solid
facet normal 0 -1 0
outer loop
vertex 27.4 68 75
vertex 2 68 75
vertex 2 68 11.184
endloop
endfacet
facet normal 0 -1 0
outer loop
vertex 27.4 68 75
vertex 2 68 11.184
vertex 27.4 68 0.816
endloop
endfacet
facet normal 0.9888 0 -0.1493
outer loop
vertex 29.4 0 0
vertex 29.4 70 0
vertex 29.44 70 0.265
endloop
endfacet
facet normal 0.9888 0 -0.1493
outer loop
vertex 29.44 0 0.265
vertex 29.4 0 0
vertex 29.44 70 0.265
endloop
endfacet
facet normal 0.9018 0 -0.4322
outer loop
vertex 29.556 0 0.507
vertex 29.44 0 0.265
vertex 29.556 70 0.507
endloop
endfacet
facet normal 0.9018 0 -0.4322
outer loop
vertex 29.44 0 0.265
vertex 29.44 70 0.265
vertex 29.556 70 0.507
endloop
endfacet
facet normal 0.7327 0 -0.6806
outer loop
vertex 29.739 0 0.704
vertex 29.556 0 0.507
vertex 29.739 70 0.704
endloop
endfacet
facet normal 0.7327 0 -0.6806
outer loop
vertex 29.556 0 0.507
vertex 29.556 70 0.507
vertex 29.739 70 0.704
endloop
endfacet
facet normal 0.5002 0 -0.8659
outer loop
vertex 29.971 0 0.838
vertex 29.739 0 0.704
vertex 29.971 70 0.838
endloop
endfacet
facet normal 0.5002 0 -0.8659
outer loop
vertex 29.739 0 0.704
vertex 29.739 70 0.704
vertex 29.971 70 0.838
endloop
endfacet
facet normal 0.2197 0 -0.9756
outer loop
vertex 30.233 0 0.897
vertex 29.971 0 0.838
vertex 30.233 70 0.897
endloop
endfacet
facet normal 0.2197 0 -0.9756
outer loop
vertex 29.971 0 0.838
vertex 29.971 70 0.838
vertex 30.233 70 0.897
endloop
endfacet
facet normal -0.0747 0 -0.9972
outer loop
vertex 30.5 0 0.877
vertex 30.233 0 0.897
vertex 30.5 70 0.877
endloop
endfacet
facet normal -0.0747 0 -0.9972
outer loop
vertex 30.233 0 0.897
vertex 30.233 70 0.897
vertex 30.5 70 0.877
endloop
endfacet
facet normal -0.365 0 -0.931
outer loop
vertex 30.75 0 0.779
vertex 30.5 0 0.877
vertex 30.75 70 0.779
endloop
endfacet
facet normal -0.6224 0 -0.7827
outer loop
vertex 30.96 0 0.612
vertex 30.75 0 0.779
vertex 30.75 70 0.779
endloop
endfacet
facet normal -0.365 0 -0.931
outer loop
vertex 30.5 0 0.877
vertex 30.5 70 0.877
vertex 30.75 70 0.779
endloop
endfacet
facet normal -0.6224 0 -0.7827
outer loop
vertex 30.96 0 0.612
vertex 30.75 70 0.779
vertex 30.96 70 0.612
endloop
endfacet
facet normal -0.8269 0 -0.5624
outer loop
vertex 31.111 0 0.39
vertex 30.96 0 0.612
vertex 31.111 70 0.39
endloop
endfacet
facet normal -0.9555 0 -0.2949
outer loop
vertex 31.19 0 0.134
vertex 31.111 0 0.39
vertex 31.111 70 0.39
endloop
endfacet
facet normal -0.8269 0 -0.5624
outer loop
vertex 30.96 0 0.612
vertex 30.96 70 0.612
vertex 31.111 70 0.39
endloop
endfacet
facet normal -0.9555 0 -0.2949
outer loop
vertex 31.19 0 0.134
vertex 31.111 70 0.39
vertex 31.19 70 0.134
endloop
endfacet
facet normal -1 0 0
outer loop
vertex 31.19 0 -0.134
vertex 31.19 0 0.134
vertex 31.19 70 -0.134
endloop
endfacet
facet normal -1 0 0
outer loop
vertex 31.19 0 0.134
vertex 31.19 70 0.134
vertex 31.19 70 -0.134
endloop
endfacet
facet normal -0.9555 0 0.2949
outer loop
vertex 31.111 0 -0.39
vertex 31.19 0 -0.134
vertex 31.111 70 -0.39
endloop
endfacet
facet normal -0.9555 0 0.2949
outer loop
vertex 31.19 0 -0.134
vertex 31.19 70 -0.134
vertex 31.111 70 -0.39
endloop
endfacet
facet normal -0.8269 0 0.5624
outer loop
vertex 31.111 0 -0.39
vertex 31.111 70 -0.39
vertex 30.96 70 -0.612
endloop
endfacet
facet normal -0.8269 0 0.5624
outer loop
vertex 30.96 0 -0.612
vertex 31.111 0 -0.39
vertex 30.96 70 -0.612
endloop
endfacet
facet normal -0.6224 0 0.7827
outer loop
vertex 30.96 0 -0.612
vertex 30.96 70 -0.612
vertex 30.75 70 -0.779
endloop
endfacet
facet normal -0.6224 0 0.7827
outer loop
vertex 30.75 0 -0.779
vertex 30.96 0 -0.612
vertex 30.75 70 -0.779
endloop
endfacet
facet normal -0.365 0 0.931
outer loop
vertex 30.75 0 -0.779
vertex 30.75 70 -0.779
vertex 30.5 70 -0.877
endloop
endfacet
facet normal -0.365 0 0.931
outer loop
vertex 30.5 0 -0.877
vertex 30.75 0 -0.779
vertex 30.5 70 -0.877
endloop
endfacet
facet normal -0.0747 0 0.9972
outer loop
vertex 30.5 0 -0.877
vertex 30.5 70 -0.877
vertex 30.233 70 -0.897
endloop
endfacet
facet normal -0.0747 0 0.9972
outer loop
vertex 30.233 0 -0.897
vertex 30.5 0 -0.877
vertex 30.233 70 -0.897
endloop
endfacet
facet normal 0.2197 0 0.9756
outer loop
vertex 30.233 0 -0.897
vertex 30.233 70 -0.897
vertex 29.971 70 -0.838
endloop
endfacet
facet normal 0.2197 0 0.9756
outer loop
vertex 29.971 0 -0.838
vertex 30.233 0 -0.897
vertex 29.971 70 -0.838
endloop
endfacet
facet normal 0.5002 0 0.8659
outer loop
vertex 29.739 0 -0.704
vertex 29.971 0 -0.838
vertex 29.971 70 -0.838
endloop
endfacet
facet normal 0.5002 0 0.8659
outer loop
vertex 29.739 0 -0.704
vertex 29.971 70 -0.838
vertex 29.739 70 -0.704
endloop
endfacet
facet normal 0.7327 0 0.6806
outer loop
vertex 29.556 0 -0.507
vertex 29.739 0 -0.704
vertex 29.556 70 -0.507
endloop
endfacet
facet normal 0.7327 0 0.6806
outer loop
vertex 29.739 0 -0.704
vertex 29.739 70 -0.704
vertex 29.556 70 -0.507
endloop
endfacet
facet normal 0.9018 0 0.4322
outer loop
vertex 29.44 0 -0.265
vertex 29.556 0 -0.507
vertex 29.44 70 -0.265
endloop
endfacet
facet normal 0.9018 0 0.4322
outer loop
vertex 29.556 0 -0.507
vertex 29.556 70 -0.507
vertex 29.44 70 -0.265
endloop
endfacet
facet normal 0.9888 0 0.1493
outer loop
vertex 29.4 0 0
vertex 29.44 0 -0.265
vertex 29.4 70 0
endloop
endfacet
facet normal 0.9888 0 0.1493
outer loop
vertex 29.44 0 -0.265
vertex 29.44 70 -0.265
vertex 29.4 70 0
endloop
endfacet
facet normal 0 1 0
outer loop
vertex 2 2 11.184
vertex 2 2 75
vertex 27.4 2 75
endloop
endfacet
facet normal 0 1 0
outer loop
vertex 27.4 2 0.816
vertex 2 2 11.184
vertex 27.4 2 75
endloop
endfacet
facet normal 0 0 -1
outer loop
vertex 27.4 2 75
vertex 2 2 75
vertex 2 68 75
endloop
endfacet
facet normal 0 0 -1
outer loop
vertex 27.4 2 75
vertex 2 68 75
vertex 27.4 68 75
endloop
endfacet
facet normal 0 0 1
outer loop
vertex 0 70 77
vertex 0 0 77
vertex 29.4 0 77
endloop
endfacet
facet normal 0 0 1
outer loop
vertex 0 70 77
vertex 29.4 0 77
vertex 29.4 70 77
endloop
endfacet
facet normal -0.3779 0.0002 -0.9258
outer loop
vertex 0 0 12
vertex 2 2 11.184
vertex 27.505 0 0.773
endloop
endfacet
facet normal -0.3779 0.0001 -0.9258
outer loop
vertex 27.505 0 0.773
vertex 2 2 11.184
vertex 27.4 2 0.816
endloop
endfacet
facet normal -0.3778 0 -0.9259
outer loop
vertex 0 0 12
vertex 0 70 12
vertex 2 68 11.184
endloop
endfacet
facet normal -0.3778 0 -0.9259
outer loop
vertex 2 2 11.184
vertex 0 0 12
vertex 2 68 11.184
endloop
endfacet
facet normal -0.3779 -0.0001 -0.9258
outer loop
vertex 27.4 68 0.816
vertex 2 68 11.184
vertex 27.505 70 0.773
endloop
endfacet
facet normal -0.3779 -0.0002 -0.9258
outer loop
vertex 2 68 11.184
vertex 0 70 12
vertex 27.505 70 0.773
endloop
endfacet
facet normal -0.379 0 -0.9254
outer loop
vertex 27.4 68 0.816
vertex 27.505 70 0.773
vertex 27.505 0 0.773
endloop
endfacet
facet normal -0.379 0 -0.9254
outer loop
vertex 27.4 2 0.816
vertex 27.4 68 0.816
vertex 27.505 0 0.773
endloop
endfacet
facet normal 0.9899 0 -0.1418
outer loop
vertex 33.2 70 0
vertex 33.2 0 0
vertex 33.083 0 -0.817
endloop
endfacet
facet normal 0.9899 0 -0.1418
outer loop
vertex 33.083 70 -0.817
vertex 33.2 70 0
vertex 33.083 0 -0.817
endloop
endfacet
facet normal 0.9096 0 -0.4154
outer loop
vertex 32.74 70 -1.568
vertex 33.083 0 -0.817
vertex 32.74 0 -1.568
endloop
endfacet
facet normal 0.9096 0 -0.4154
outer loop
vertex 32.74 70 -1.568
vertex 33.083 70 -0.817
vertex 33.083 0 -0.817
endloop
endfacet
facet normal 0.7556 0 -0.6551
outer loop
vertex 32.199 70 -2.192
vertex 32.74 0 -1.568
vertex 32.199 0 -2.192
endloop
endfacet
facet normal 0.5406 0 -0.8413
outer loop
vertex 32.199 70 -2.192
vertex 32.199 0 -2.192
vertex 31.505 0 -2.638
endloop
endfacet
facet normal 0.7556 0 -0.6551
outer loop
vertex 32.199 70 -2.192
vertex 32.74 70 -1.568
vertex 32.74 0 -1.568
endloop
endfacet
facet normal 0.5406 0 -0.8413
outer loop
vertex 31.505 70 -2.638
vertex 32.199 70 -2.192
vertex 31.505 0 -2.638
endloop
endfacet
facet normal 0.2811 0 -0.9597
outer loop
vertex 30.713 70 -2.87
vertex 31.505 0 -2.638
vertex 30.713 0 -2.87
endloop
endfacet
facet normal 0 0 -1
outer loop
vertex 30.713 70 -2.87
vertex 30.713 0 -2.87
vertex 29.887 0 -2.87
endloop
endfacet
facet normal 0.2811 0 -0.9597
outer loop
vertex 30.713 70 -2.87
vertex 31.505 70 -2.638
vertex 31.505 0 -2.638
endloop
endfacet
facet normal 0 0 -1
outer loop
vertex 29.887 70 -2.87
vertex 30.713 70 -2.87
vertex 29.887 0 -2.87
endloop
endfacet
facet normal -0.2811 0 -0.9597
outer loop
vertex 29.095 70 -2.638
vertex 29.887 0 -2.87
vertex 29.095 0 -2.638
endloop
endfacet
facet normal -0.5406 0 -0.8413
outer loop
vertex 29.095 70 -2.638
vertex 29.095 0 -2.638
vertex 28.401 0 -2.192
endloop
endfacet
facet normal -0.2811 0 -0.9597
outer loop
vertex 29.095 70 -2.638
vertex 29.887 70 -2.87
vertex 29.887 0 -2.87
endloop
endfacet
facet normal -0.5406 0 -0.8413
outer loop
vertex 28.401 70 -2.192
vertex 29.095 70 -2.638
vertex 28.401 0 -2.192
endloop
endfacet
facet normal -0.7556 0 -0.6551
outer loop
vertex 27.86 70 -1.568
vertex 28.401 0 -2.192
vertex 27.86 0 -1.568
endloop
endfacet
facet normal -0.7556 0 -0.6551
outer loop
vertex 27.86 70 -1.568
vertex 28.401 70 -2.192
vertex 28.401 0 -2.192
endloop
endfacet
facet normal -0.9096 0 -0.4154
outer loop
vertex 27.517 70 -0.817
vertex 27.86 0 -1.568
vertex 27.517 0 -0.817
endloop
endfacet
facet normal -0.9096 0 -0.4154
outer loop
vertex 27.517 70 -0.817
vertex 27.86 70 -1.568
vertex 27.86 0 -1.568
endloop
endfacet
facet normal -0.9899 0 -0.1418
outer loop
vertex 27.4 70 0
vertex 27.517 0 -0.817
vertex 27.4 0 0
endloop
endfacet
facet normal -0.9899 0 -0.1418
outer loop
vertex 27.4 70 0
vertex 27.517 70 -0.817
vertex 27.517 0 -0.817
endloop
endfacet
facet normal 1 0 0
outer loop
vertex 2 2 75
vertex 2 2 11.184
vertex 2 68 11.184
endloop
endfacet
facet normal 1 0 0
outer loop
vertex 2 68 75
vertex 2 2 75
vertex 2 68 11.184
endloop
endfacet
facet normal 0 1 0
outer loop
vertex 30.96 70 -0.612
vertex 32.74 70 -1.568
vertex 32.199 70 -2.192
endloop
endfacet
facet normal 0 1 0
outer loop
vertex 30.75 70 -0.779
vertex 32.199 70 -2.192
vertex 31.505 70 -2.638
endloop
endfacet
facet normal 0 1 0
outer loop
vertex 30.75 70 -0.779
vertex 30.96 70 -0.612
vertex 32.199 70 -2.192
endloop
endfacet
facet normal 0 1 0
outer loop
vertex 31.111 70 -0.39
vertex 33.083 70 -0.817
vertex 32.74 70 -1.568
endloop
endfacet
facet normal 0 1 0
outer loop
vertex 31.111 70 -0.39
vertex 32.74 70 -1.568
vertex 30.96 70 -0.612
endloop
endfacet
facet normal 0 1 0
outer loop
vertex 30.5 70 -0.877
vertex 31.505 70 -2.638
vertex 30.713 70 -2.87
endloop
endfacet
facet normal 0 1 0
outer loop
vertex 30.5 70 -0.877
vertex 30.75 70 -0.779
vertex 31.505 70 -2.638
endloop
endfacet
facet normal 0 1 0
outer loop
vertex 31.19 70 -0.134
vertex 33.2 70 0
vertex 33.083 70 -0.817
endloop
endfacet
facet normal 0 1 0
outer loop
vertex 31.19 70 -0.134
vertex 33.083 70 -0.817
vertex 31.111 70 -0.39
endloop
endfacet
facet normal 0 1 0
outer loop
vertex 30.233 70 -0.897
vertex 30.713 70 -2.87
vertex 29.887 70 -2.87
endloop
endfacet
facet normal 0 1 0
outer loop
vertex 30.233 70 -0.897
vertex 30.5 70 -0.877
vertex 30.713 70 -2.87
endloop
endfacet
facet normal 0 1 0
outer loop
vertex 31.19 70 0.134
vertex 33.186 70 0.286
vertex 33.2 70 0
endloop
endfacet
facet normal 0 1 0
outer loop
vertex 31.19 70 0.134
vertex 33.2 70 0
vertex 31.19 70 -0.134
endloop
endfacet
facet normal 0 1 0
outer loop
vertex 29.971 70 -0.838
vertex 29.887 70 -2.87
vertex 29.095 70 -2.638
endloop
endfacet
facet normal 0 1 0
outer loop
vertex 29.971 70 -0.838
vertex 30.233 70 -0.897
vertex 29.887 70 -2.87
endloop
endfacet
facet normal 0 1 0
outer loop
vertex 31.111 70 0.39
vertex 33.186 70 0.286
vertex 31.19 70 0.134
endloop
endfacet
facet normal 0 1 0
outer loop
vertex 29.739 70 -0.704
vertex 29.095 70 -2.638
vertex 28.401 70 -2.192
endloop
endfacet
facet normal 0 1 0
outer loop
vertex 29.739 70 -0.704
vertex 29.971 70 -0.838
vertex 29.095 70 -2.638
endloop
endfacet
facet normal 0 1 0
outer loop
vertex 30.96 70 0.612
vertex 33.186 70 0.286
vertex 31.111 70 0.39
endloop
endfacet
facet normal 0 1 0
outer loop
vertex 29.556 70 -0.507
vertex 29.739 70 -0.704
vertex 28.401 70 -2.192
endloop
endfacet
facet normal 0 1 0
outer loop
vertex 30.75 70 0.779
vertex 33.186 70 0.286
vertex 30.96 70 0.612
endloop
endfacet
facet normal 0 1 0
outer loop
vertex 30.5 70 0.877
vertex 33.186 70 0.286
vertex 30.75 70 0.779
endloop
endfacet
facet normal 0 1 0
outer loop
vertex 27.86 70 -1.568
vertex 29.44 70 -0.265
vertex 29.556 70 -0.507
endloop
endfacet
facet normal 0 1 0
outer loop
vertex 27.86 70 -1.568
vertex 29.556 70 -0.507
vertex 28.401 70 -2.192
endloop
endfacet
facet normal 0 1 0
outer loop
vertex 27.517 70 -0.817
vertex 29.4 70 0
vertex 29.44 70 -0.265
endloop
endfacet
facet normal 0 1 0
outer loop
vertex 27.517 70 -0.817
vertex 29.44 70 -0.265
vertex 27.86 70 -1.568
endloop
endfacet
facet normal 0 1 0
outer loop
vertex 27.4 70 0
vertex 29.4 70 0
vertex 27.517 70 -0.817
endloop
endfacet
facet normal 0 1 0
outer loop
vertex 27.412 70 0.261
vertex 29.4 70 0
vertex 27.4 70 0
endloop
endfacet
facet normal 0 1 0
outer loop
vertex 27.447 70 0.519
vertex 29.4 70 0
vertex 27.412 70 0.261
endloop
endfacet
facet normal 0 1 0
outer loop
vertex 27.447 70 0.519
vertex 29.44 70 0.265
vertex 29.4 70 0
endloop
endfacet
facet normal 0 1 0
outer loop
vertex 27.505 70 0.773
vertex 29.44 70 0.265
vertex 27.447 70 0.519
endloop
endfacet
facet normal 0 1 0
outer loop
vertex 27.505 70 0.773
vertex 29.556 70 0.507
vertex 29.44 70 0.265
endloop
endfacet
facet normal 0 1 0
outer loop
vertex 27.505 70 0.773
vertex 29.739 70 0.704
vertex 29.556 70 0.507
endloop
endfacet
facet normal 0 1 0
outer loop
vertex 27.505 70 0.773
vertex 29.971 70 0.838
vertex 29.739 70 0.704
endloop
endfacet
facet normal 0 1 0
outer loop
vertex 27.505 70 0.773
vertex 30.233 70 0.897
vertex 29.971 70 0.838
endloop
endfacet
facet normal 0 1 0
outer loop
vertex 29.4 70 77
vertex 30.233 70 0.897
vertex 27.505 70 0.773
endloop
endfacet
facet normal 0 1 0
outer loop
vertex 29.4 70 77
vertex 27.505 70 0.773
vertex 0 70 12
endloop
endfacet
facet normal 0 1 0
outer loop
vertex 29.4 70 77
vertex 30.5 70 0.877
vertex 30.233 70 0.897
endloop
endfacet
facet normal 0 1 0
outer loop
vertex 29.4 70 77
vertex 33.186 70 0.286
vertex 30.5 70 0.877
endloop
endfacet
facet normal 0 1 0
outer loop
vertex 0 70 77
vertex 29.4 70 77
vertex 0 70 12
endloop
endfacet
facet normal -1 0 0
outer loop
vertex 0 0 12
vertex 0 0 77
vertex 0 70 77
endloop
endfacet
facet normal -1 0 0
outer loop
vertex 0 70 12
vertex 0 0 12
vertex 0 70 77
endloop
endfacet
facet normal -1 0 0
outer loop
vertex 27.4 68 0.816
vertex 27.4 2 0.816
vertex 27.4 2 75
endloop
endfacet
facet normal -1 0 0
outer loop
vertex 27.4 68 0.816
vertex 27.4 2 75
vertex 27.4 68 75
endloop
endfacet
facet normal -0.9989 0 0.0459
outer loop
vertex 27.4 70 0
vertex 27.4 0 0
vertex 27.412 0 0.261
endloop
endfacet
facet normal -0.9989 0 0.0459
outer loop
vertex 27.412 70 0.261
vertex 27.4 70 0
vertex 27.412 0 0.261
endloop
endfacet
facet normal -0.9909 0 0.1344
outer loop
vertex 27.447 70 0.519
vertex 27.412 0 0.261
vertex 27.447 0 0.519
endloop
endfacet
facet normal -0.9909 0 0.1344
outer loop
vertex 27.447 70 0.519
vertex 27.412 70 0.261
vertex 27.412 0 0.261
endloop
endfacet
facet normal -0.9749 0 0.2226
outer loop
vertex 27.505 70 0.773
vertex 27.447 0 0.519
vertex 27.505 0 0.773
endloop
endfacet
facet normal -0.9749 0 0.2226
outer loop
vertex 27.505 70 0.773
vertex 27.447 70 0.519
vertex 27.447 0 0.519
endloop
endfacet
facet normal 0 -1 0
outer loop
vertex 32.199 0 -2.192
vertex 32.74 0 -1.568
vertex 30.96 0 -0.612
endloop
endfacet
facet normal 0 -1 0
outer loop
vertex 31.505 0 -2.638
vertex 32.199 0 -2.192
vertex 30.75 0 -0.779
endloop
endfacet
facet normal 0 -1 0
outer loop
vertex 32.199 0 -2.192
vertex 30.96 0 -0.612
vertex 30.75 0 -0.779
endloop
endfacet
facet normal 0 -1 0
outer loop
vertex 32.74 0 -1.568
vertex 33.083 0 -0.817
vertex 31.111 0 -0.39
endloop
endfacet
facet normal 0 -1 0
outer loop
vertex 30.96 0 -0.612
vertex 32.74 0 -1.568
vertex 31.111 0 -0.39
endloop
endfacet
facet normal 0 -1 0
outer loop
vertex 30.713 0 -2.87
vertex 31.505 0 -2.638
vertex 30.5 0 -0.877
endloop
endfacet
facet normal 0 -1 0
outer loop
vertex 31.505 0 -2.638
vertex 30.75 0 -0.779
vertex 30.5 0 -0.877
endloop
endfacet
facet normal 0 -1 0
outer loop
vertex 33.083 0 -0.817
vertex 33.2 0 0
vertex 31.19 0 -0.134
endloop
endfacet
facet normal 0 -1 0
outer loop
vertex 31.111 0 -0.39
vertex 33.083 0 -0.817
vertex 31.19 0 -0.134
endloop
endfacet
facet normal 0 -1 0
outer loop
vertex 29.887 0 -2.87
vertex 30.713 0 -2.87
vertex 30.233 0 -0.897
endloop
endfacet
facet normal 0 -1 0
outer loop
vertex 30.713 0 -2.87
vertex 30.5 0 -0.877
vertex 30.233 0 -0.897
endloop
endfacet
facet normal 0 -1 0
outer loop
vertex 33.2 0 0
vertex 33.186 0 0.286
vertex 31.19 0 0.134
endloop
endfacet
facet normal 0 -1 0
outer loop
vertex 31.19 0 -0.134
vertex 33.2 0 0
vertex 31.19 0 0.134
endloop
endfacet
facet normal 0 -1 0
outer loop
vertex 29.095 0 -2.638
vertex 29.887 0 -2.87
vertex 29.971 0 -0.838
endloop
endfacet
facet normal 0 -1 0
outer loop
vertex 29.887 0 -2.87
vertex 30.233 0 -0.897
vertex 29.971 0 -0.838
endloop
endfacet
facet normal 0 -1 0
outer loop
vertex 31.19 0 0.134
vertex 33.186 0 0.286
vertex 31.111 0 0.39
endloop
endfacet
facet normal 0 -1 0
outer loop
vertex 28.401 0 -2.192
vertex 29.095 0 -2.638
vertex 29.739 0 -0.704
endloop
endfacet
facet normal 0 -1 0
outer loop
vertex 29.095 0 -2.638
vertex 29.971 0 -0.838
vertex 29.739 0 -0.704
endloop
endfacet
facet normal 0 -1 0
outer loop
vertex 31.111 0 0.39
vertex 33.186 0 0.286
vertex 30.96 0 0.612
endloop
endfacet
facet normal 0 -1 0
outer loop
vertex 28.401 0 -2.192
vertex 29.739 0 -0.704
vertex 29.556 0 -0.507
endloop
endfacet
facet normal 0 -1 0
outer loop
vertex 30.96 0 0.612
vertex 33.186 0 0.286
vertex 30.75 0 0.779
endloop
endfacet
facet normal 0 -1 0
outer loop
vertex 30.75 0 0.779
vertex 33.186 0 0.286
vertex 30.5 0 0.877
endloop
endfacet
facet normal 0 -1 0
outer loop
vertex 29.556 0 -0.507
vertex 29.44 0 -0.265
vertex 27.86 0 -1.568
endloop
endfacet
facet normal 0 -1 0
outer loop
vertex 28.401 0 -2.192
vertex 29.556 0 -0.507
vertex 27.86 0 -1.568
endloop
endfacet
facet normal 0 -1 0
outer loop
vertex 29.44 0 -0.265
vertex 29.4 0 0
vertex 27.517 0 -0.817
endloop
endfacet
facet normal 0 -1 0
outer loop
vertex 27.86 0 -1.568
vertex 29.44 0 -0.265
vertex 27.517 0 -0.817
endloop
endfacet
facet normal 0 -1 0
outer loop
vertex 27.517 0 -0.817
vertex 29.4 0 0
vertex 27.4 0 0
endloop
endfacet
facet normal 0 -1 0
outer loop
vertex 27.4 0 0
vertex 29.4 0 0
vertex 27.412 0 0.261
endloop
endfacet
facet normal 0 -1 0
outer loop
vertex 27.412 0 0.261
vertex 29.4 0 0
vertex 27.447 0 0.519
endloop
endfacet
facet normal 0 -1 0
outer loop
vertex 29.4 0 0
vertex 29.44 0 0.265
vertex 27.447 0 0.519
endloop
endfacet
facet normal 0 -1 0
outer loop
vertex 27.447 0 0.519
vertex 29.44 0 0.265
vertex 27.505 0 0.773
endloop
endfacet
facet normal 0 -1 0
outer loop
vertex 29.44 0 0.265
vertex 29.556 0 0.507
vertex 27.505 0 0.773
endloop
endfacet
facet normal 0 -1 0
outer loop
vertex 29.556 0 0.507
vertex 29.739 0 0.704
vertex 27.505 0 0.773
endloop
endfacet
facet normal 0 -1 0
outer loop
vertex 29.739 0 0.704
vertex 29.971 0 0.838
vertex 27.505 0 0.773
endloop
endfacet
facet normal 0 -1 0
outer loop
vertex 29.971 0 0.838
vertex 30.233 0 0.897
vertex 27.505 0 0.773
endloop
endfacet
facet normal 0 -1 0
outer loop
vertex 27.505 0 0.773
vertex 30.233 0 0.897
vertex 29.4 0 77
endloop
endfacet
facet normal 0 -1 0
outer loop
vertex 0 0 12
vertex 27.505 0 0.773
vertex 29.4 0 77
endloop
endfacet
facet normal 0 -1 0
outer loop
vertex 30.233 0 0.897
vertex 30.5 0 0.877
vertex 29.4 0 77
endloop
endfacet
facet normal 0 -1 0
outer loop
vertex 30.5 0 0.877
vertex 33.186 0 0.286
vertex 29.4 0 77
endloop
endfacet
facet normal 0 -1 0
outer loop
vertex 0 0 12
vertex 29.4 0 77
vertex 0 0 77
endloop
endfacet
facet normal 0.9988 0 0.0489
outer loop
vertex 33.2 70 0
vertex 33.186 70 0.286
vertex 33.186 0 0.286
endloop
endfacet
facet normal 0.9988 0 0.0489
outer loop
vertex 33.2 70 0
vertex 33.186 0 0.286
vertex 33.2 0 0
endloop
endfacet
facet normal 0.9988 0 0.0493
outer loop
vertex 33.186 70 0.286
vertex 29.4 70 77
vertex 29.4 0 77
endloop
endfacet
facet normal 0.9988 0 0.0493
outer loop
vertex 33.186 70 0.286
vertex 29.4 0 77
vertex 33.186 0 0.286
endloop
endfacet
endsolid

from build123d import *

# Parameters (mm, degrees)
F0_W     = 70
F0_H     = 77
F1_DEPTH = 29.4
F2_W     = 25.4
F2_H     = 66
F3_DEPTH = 75
F5_DEPTH = 70
F6_R     = 0.9
F7_DEPTH = 70
F8_DEPTH = 70


with BuildPart() as f1:
    # F0 (on Right) → F1 (new body)
    with BuildSketch(Plane.YZ):
        with Locations((35, 38.5)):
            Rectangle(F0_W, F0_H)
    extrude(amount=F1_DEPTH)

    # F2 (on Top) → F3 (cut)
    with BuildSketch(Plane.XY):
        with Locations((14.7, 35)):
            Rectangle(F2_W, F2_H)
    extrude(amount=F3_DEPTH, mode=Mode.SUBTRACT)

    # F4 (on face) → F5 (cut, through all)
    with BuildSketch(Plane(origin=(0, 70, 0), x_dir=(-1, 0, 0), z_dir=(0, 1, 0))):
        Polygon((0, 0), (0, 12), (-29.4, 0), align=None)
    extrude(amount=-F5_DEPTH, mode=Mode.SUBTRACT)

    # F6 (on face) → F7 (join)
    with BuildSketch(Plane(origin=(0, 70, 0), x_dir=(-1, 0, 0), z_dir=(0, 1, 0))):
        with BuildLine():
            ThreePointArc((-33.1859084974, 0.2855383414), (-31.8851667844, 2.4284246469), (-29.4, 2.7568097504))
            Line((-29.4, 2.7568097504), (-29.4, 77))
            Line((-29.4, 77), (-33.1859084974, 0.2855383414))
        make_face()
        with BuildLine():
            Line((-27.5050449892, 0.7734510248), (-29.4, 0))
            Line((-29.4, 0), (-29.4, 2.7568097504))
            ThreePointArc((-29.4, 2.7568097504), (-31.8851667844, 2.4284246469), (-33.1859084974, 0.2855383414))
            Line((-33.1859084974, 0.2855383414), (-33.2, 0))
            ThreePointArc((-33.2, 0), (-30.3, -2.9), (-27.4, 0))
            ThreePointArc((-27.4, 0), (-27.4263812421, 0.390275844), (-27.5050449892, 0.7734510248))
        make_face()
        with Locations((-30.3, 0)):
            Circle(F6_R, mode=Mode.SUBTRACT)
        with Locations((-30.3, 0)):
            Circle(F6_R)
    extrude(amount=-F7_DEPTH)

    # F6 (on face) → F8 (cut, through all)
    with BuildSketch(Plane(origin=(0, 70, 0), x_dir=(-1, 0, 0), z_dir=(0, 1, 0))):
        with Locations((-30.3, 0)):
            Circle(F6_R)
    extrude(amount=-F8_DEPTH, mode=Mode.SUBTRACT)


solid = f1.part
